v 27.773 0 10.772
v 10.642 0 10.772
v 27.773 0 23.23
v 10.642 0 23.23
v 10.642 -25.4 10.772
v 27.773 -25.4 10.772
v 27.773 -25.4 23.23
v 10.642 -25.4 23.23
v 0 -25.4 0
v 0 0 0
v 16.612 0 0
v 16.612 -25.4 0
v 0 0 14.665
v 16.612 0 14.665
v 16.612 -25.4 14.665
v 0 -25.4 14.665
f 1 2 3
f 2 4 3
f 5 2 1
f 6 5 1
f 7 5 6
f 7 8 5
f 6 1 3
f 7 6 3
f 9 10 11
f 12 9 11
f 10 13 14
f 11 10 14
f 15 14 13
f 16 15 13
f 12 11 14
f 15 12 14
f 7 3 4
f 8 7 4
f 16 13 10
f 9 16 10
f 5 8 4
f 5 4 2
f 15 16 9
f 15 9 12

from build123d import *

# Parameters (mm, degrees)
F0_W     = 5.969814
F0_H     = 3.893358
F1_DEPTH = 25.4
F2_DEPTH = 25.4


with BuildPart() as f1:
    # F0 (on Front) → F1 (new body)
    with BuildSketch(Plane.XZ):
        Polygon((0, 14.664982), (0, 0), (16.611656, 0), (16.611656, 10.771624), (10.641842, 10.771624), (10.641842, 14.664982), align=None)
        with Locations((13.626749, 12.718303)):
            Rectangle(F0_W, F0_H)
    extrude(amount=F1_DEPTH)


with BuildPart() as f2:
    # F0 (on Front) → F2 (new body)
    with BuildSketch(Plane.XZ):
        with Locations((13.626749, 12.718303)):
            Rectangle(F0_W, F0_H)
        Polygon((16.611656, 14.664982), (16.611656, 10.771624), (27.772613, 10.771624), (27.772613, 23.230368), (10.641842, 23.230368), (10.641842, 14.664982), align=None)
    extrude(amount=F2_DEPTH)


solid = Compound([f1.part, f2.part])
